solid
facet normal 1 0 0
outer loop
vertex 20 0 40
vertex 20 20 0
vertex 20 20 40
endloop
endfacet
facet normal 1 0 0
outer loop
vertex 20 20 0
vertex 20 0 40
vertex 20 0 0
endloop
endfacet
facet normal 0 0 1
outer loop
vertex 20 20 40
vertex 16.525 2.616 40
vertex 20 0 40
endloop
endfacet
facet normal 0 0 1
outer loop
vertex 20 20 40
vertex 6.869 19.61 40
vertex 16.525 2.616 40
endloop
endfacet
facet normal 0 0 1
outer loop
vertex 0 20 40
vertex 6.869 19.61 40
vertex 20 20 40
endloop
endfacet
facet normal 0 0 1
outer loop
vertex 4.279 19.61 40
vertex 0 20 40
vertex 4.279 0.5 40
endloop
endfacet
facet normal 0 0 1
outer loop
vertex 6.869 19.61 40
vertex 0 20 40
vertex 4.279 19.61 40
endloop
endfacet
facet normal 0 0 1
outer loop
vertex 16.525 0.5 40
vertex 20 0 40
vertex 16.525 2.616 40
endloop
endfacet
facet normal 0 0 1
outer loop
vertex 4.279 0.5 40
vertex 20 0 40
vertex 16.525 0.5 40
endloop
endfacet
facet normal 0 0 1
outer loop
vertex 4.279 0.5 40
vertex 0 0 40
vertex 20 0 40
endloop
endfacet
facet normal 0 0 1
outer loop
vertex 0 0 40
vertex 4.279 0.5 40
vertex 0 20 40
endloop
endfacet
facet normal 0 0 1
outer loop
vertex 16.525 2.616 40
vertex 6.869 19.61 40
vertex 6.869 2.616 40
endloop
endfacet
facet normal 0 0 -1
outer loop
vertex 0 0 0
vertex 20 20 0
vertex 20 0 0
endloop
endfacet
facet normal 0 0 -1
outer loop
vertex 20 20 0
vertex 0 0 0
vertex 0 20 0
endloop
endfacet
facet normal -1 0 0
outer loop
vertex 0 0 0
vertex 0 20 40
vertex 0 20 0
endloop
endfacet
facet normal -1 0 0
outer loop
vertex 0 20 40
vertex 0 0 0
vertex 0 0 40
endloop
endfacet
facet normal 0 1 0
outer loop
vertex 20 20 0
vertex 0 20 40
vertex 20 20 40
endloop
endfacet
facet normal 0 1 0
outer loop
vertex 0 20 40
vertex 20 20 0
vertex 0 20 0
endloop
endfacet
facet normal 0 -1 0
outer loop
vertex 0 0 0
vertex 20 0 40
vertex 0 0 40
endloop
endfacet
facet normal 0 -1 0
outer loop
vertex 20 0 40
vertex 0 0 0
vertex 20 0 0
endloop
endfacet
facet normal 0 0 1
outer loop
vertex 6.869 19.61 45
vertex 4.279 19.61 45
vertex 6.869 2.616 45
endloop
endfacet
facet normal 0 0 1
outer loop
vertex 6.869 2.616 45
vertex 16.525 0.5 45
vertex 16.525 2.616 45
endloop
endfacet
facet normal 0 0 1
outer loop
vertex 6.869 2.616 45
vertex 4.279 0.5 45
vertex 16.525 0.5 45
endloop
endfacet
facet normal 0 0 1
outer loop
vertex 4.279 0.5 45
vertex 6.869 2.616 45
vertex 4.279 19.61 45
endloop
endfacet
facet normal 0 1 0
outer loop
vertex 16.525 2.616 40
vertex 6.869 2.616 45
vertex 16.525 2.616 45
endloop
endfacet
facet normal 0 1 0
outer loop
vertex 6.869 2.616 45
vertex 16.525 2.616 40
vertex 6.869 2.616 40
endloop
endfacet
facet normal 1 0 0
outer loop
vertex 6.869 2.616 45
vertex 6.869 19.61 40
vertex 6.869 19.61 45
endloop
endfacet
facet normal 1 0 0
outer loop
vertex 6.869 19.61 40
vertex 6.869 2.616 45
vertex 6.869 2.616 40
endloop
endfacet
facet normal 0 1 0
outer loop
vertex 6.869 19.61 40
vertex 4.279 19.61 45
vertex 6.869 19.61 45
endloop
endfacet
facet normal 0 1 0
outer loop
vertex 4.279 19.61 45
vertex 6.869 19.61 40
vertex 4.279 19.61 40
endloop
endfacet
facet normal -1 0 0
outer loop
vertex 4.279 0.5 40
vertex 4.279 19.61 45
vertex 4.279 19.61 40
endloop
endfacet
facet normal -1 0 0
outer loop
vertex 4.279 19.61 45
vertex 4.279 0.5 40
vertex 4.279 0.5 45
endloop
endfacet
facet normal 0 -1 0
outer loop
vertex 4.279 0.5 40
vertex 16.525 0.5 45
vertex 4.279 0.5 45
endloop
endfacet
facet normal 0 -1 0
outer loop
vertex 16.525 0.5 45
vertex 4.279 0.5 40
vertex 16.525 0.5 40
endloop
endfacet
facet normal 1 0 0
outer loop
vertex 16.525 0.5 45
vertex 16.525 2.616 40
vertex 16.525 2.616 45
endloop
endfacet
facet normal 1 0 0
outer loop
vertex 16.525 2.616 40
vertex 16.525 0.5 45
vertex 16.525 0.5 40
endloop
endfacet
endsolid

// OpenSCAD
cube([20, 20, 40]);
translate([2, 0.5, 40]){
    linear_extrude(5){
        text("L", size=20);
    }
}
